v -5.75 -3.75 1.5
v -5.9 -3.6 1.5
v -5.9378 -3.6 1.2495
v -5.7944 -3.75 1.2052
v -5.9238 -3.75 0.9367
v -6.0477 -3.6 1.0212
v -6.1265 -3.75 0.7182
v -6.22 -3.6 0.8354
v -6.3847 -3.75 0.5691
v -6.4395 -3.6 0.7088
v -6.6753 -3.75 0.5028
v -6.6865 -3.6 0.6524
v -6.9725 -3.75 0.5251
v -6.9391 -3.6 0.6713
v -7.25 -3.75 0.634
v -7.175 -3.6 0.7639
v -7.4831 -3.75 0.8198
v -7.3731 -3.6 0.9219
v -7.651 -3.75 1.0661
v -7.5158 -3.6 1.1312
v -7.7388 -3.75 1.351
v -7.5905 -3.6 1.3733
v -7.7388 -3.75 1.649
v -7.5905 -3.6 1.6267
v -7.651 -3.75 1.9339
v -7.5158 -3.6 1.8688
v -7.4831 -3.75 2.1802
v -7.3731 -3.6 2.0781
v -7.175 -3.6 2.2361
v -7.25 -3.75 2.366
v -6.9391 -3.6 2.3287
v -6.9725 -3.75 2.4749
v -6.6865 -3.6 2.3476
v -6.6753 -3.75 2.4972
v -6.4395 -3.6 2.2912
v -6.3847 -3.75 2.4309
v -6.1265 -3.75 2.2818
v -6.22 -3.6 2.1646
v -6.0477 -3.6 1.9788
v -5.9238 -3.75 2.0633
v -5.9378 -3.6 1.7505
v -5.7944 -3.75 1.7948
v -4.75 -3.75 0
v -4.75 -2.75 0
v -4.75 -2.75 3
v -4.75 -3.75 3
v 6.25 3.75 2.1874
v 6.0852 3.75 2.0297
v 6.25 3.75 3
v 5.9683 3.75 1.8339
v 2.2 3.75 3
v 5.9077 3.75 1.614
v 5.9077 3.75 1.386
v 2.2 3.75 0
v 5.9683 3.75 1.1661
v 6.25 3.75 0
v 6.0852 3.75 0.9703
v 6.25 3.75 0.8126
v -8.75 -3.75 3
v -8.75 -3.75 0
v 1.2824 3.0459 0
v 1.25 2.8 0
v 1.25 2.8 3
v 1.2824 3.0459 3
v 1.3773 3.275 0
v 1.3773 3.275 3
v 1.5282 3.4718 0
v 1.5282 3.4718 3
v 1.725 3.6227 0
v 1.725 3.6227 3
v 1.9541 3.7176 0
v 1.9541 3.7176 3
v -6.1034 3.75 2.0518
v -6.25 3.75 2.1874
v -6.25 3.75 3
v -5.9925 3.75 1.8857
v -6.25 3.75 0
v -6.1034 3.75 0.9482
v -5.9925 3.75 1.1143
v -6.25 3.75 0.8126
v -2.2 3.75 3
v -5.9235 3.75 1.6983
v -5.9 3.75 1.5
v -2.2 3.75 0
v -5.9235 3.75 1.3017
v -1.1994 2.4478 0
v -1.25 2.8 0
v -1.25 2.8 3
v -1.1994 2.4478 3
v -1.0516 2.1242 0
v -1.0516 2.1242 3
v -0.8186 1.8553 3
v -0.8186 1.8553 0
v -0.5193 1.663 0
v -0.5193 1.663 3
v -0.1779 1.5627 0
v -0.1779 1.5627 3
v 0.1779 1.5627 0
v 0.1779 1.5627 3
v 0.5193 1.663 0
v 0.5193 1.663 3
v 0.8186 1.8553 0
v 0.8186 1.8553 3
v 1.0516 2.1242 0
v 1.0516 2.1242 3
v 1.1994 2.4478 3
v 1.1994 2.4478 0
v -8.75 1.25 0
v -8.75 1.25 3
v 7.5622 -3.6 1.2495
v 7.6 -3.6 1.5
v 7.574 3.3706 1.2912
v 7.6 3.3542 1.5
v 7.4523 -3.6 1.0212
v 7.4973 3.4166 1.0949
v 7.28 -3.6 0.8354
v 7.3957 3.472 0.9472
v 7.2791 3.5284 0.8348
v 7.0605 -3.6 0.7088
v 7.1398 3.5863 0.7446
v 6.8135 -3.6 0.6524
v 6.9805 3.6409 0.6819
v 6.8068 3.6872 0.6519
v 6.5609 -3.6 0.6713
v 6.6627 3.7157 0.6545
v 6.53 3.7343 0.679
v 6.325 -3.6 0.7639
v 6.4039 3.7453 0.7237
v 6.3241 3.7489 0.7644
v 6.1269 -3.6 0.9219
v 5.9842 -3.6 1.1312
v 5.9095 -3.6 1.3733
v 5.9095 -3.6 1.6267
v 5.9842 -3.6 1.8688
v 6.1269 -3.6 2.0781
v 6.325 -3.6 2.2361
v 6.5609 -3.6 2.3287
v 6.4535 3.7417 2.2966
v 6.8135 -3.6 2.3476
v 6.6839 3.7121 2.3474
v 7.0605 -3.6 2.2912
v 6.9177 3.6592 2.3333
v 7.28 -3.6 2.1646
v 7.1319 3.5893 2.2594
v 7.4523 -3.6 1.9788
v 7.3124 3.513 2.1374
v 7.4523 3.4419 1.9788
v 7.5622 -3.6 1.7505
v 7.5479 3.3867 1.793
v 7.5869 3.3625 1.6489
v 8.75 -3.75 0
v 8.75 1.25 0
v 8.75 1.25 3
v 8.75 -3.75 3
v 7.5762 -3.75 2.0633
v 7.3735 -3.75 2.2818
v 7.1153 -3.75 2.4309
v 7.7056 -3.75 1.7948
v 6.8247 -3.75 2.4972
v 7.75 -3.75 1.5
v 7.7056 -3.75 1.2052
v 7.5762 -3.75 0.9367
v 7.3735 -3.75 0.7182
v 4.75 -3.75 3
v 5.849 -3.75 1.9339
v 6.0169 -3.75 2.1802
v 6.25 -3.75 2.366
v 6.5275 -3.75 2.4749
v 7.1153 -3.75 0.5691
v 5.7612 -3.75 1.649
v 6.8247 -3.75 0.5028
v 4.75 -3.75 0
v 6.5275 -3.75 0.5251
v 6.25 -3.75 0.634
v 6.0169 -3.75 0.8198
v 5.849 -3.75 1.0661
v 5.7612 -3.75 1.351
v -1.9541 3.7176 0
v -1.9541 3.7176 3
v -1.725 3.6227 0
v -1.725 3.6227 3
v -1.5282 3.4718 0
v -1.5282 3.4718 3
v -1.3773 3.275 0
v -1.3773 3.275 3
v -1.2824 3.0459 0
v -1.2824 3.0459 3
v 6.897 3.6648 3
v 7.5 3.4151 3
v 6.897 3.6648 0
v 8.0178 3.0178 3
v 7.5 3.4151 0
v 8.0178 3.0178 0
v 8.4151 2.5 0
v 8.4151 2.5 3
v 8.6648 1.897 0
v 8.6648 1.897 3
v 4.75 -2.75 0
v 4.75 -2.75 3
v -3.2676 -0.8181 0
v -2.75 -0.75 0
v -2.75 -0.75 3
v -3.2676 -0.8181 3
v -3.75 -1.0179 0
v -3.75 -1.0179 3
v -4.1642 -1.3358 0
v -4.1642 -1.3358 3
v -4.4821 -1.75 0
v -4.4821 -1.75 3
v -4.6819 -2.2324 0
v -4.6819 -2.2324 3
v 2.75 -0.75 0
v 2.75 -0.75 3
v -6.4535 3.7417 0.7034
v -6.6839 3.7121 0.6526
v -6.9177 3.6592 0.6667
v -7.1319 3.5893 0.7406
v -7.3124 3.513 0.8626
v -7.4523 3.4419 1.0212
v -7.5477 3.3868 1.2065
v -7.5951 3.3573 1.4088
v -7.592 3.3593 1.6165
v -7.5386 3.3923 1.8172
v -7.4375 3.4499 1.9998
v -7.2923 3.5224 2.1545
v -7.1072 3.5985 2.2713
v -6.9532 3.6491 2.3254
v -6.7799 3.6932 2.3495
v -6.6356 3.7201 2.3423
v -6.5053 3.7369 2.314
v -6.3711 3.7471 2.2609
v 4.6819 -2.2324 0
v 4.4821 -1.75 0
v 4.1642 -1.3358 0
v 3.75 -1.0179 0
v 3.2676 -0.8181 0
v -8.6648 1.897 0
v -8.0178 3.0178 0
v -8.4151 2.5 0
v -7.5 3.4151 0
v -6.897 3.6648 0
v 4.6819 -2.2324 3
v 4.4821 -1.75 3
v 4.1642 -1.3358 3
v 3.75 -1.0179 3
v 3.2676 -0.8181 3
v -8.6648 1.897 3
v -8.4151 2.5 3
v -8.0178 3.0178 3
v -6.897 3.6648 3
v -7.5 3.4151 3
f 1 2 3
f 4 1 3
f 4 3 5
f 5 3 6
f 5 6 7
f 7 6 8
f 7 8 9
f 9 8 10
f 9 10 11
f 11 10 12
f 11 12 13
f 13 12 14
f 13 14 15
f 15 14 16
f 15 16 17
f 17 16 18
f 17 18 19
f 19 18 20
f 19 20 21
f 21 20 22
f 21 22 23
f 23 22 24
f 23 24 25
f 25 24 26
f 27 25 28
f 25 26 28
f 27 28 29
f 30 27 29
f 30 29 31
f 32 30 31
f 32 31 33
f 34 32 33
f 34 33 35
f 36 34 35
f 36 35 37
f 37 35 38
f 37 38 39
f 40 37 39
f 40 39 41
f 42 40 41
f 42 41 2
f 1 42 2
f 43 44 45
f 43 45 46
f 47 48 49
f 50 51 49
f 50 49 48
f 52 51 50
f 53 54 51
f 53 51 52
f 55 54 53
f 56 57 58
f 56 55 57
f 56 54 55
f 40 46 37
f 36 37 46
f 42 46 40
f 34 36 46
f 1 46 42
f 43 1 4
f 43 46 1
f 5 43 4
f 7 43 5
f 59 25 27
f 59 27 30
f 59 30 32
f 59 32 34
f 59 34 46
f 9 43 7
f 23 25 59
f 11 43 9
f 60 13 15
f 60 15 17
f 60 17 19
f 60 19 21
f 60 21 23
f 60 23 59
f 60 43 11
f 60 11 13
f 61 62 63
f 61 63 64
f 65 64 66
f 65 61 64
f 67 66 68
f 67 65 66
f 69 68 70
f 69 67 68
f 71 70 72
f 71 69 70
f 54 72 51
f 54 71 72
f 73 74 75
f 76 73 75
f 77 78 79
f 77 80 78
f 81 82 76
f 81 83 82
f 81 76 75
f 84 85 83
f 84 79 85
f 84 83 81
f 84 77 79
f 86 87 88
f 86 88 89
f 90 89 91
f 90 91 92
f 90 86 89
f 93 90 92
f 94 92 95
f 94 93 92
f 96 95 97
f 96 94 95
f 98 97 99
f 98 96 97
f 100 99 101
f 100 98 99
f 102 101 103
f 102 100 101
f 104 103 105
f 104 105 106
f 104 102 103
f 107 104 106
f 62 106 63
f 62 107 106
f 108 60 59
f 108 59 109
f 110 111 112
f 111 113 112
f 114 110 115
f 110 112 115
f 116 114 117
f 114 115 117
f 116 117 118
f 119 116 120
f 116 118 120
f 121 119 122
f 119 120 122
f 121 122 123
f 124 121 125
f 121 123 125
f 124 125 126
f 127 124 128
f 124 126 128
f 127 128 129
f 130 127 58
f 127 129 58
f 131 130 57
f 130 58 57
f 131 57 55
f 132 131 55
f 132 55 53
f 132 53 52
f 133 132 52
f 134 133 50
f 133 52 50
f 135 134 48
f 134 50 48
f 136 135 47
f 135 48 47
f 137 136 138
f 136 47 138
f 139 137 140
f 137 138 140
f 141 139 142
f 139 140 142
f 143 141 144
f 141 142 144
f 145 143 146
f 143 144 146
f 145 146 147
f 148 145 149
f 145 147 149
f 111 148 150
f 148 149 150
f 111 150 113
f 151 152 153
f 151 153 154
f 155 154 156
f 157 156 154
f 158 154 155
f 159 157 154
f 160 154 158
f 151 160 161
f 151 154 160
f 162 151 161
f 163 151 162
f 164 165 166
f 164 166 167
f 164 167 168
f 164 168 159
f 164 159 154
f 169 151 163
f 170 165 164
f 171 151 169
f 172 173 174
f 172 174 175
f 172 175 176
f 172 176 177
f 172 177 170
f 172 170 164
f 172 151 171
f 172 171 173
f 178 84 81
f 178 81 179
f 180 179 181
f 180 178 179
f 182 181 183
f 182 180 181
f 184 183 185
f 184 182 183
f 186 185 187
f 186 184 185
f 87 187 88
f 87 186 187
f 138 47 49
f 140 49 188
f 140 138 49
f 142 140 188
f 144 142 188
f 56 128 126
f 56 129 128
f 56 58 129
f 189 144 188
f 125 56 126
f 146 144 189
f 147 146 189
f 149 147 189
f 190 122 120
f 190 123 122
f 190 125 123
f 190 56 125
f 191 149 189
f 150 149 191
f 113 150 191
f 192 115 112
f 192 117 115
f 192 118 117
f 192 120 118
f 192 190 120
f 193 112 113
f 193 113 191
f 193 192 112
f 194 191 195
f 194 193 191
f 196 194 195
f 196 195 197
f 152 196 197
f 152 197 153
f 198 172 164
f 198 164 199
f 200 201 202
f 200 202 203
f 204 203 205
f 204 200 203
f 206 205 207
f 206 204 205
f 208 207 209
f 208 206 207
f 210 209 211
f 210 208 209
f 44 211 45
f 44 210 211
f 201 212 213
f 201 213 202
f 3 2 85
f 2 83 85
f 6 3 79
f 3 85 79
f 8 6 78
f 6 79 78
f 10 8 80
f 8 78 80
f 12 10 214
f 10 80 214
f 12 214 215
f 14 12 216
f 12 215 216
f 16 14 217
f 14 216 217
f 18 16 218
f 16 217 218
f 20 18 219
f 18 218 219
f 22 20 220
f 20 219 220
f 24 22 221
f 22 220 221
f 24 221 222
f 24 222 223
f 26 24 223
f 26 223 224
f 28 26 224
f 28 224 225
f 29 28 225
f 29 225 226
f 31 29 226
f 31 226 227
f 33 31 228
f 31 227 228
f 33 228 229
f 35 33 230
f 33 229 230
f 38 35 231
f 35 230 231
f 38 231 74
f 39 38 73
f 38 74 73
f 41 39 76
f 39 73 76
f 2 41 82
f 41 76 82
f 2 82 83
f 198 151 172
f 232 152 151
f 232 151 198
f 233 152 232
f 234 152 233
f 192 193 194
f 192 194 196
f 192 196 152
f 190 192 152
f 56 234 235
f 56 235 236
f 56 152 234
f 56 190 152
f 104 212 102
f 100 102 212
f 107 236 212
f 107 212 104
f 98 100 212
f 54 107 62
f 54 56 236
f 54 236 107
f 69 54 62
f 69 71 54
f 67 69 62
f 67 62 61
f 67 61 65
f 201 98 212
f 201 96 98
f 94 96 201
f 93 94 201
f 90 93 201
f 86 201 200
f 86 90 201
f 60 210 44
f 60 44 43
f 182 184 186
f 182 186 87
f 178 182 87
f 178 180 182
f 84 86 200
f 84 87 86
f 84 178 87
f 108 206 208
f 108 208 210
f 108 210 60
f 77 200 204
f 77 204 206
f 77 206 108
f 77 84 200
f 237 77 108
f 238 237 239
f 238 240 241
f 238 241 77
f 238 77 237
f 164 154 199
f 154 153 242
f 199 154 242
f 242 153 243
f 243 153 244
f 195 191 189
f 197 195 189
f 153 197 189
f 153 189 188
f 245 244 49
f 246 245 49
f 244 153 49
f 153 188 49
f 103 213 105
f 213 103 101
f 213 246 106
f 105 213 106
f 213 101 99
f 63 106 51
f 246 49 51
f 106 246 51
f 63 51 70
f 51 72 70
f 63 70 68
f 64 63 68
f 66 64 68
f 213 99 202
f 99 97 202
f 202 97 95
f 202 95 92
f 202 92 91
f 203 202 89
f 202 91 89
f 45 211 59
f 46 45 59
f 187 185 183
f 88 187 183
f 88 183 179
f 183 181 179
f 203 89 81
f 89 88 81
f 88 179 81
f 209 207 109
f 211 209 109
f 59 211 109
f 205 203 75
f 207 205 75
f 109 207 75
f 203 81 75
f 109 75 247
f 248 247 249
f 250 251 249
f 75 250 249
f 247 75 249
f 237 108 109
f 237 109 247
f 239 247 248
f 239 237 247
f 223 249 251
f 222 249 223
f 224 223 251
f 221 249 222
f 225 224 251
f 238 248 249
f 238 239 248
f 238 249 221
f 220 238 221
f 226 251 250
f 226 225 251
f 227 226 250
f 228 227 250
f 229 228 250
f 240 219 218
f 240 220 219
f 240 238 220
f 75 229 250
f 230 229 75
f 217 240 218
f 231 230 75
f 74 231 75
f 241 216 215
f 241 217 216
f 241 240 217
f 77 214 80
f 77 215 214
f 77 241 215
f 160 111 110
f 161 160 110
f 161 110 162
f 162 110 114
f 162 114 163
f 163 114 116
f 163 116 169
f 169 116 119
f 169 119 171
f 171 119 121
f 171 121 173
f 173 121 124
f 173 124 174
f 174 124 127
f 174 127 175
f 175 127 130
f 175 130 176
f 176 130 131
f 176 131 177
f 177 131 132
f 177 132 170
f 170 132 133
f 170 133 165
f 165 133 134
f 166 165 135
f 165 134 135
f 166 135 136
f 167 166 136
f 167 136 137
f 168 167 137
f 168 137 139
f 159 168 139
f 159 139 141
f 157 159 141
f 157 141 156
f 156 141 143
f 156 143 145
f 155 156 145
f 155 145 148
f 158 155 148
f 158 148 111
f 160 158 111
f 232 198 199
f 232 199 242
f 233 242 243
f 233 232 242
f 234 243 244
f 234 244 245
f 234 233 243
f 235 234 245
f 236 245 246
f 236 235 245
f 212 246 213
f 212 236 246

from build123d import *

# Parameters (mm, degrees)
BOSS_EXTRUDE1_DEPTH                                  = 3
CSK_FOR_M1_6_COUNTERSUNK_FLAT_HEAD_SCREW_D           = 1.7
CSK_FOR_M1_6_COUNTERSUNK_FLAT_HEAD_SCREW_CSINK_D     = 2
CSK_FOR_M1_6_COUNTERSUNK_FLAT_HEAD_SCREW_CSINK_ANGLE = 90


with BuildPart() as part:
    # Sketch1 → Boss-Extrude1 (new body)
    with BuildSketch(Plane.XY):
        with BuildLine():
            Line((8.75, -3.75), (4.75, -3.75))
            Line((4.75, -3.75), (4.75, -2.75))
            ThreePointArc((4.75, -2.75), (4.164213562, -1.335786438), (2.75, -0.75))
            Line((2.75, -0.75), (-2.75, -0.75))
            ThreePointArc((-2.75, -0.75), (-4.164213562, -1.335786438), (-4.75, -2.75))
            Line((-4.75, -2.75), (-4.75, -3.75))
            Line((-4.75, -3.75), (-8.75, -3.75))
            Line((-8.75, -3.75), (-8.75, 1.25))
            ThreePointArc((-8.75, 1.25), (-8.017766953, 3.017766953), (-6.25, 3.75))
            Line((-6.25, 3.75), (-2.2, 3.75))
            ThreePointArc((-2.2, 3.75), (-1.528248558, 3.471751442), (-1.25, 2.8))
            ThreePointArc((-1.25, 2.8), (0, 1.55), (1.25, 2.8))
            ThreePointArc((1.25, 2.8), (1.528248558, 3.471751442), (2.2, 3.75))
            Line((2.2, 3.75), (6.25, 3.75))
            ThreePointArc((6.25, 3.75), (8.017766953, 3.017766953), (8.75, 1.25))
            Line((8.75, 1.25), (8.75, -3.75))
        make_face()
    extrude(amount=BOSS_EXTRUDE1_DEPTH)

    # CSK for M1.6 Countersunk Flat Head Screw1 (through all)
    with Locations(Plane(origin=(0, -3.75, 0), x_dir=(-1, 0, 0), z_dir=(0, -1, 0))):
        with Locations((6.75, -1.5), (-6.75, -1.5)):
            CounterSinkHole(CSK_FOR_M1_6_COUNTERSUNK_FLAT_HEAD_SCREW_D / 2, CSK_FOR_M1_6_COUNTERSUNK_FLAT_HEAD_SCREW_CSINK_D / 2, counter_sink_angle=CSK_FOR_M1_6_COUNTERSUNK_FLAT_HEAD_SCREW_CSINK_ANGLE)


solid = part.part
